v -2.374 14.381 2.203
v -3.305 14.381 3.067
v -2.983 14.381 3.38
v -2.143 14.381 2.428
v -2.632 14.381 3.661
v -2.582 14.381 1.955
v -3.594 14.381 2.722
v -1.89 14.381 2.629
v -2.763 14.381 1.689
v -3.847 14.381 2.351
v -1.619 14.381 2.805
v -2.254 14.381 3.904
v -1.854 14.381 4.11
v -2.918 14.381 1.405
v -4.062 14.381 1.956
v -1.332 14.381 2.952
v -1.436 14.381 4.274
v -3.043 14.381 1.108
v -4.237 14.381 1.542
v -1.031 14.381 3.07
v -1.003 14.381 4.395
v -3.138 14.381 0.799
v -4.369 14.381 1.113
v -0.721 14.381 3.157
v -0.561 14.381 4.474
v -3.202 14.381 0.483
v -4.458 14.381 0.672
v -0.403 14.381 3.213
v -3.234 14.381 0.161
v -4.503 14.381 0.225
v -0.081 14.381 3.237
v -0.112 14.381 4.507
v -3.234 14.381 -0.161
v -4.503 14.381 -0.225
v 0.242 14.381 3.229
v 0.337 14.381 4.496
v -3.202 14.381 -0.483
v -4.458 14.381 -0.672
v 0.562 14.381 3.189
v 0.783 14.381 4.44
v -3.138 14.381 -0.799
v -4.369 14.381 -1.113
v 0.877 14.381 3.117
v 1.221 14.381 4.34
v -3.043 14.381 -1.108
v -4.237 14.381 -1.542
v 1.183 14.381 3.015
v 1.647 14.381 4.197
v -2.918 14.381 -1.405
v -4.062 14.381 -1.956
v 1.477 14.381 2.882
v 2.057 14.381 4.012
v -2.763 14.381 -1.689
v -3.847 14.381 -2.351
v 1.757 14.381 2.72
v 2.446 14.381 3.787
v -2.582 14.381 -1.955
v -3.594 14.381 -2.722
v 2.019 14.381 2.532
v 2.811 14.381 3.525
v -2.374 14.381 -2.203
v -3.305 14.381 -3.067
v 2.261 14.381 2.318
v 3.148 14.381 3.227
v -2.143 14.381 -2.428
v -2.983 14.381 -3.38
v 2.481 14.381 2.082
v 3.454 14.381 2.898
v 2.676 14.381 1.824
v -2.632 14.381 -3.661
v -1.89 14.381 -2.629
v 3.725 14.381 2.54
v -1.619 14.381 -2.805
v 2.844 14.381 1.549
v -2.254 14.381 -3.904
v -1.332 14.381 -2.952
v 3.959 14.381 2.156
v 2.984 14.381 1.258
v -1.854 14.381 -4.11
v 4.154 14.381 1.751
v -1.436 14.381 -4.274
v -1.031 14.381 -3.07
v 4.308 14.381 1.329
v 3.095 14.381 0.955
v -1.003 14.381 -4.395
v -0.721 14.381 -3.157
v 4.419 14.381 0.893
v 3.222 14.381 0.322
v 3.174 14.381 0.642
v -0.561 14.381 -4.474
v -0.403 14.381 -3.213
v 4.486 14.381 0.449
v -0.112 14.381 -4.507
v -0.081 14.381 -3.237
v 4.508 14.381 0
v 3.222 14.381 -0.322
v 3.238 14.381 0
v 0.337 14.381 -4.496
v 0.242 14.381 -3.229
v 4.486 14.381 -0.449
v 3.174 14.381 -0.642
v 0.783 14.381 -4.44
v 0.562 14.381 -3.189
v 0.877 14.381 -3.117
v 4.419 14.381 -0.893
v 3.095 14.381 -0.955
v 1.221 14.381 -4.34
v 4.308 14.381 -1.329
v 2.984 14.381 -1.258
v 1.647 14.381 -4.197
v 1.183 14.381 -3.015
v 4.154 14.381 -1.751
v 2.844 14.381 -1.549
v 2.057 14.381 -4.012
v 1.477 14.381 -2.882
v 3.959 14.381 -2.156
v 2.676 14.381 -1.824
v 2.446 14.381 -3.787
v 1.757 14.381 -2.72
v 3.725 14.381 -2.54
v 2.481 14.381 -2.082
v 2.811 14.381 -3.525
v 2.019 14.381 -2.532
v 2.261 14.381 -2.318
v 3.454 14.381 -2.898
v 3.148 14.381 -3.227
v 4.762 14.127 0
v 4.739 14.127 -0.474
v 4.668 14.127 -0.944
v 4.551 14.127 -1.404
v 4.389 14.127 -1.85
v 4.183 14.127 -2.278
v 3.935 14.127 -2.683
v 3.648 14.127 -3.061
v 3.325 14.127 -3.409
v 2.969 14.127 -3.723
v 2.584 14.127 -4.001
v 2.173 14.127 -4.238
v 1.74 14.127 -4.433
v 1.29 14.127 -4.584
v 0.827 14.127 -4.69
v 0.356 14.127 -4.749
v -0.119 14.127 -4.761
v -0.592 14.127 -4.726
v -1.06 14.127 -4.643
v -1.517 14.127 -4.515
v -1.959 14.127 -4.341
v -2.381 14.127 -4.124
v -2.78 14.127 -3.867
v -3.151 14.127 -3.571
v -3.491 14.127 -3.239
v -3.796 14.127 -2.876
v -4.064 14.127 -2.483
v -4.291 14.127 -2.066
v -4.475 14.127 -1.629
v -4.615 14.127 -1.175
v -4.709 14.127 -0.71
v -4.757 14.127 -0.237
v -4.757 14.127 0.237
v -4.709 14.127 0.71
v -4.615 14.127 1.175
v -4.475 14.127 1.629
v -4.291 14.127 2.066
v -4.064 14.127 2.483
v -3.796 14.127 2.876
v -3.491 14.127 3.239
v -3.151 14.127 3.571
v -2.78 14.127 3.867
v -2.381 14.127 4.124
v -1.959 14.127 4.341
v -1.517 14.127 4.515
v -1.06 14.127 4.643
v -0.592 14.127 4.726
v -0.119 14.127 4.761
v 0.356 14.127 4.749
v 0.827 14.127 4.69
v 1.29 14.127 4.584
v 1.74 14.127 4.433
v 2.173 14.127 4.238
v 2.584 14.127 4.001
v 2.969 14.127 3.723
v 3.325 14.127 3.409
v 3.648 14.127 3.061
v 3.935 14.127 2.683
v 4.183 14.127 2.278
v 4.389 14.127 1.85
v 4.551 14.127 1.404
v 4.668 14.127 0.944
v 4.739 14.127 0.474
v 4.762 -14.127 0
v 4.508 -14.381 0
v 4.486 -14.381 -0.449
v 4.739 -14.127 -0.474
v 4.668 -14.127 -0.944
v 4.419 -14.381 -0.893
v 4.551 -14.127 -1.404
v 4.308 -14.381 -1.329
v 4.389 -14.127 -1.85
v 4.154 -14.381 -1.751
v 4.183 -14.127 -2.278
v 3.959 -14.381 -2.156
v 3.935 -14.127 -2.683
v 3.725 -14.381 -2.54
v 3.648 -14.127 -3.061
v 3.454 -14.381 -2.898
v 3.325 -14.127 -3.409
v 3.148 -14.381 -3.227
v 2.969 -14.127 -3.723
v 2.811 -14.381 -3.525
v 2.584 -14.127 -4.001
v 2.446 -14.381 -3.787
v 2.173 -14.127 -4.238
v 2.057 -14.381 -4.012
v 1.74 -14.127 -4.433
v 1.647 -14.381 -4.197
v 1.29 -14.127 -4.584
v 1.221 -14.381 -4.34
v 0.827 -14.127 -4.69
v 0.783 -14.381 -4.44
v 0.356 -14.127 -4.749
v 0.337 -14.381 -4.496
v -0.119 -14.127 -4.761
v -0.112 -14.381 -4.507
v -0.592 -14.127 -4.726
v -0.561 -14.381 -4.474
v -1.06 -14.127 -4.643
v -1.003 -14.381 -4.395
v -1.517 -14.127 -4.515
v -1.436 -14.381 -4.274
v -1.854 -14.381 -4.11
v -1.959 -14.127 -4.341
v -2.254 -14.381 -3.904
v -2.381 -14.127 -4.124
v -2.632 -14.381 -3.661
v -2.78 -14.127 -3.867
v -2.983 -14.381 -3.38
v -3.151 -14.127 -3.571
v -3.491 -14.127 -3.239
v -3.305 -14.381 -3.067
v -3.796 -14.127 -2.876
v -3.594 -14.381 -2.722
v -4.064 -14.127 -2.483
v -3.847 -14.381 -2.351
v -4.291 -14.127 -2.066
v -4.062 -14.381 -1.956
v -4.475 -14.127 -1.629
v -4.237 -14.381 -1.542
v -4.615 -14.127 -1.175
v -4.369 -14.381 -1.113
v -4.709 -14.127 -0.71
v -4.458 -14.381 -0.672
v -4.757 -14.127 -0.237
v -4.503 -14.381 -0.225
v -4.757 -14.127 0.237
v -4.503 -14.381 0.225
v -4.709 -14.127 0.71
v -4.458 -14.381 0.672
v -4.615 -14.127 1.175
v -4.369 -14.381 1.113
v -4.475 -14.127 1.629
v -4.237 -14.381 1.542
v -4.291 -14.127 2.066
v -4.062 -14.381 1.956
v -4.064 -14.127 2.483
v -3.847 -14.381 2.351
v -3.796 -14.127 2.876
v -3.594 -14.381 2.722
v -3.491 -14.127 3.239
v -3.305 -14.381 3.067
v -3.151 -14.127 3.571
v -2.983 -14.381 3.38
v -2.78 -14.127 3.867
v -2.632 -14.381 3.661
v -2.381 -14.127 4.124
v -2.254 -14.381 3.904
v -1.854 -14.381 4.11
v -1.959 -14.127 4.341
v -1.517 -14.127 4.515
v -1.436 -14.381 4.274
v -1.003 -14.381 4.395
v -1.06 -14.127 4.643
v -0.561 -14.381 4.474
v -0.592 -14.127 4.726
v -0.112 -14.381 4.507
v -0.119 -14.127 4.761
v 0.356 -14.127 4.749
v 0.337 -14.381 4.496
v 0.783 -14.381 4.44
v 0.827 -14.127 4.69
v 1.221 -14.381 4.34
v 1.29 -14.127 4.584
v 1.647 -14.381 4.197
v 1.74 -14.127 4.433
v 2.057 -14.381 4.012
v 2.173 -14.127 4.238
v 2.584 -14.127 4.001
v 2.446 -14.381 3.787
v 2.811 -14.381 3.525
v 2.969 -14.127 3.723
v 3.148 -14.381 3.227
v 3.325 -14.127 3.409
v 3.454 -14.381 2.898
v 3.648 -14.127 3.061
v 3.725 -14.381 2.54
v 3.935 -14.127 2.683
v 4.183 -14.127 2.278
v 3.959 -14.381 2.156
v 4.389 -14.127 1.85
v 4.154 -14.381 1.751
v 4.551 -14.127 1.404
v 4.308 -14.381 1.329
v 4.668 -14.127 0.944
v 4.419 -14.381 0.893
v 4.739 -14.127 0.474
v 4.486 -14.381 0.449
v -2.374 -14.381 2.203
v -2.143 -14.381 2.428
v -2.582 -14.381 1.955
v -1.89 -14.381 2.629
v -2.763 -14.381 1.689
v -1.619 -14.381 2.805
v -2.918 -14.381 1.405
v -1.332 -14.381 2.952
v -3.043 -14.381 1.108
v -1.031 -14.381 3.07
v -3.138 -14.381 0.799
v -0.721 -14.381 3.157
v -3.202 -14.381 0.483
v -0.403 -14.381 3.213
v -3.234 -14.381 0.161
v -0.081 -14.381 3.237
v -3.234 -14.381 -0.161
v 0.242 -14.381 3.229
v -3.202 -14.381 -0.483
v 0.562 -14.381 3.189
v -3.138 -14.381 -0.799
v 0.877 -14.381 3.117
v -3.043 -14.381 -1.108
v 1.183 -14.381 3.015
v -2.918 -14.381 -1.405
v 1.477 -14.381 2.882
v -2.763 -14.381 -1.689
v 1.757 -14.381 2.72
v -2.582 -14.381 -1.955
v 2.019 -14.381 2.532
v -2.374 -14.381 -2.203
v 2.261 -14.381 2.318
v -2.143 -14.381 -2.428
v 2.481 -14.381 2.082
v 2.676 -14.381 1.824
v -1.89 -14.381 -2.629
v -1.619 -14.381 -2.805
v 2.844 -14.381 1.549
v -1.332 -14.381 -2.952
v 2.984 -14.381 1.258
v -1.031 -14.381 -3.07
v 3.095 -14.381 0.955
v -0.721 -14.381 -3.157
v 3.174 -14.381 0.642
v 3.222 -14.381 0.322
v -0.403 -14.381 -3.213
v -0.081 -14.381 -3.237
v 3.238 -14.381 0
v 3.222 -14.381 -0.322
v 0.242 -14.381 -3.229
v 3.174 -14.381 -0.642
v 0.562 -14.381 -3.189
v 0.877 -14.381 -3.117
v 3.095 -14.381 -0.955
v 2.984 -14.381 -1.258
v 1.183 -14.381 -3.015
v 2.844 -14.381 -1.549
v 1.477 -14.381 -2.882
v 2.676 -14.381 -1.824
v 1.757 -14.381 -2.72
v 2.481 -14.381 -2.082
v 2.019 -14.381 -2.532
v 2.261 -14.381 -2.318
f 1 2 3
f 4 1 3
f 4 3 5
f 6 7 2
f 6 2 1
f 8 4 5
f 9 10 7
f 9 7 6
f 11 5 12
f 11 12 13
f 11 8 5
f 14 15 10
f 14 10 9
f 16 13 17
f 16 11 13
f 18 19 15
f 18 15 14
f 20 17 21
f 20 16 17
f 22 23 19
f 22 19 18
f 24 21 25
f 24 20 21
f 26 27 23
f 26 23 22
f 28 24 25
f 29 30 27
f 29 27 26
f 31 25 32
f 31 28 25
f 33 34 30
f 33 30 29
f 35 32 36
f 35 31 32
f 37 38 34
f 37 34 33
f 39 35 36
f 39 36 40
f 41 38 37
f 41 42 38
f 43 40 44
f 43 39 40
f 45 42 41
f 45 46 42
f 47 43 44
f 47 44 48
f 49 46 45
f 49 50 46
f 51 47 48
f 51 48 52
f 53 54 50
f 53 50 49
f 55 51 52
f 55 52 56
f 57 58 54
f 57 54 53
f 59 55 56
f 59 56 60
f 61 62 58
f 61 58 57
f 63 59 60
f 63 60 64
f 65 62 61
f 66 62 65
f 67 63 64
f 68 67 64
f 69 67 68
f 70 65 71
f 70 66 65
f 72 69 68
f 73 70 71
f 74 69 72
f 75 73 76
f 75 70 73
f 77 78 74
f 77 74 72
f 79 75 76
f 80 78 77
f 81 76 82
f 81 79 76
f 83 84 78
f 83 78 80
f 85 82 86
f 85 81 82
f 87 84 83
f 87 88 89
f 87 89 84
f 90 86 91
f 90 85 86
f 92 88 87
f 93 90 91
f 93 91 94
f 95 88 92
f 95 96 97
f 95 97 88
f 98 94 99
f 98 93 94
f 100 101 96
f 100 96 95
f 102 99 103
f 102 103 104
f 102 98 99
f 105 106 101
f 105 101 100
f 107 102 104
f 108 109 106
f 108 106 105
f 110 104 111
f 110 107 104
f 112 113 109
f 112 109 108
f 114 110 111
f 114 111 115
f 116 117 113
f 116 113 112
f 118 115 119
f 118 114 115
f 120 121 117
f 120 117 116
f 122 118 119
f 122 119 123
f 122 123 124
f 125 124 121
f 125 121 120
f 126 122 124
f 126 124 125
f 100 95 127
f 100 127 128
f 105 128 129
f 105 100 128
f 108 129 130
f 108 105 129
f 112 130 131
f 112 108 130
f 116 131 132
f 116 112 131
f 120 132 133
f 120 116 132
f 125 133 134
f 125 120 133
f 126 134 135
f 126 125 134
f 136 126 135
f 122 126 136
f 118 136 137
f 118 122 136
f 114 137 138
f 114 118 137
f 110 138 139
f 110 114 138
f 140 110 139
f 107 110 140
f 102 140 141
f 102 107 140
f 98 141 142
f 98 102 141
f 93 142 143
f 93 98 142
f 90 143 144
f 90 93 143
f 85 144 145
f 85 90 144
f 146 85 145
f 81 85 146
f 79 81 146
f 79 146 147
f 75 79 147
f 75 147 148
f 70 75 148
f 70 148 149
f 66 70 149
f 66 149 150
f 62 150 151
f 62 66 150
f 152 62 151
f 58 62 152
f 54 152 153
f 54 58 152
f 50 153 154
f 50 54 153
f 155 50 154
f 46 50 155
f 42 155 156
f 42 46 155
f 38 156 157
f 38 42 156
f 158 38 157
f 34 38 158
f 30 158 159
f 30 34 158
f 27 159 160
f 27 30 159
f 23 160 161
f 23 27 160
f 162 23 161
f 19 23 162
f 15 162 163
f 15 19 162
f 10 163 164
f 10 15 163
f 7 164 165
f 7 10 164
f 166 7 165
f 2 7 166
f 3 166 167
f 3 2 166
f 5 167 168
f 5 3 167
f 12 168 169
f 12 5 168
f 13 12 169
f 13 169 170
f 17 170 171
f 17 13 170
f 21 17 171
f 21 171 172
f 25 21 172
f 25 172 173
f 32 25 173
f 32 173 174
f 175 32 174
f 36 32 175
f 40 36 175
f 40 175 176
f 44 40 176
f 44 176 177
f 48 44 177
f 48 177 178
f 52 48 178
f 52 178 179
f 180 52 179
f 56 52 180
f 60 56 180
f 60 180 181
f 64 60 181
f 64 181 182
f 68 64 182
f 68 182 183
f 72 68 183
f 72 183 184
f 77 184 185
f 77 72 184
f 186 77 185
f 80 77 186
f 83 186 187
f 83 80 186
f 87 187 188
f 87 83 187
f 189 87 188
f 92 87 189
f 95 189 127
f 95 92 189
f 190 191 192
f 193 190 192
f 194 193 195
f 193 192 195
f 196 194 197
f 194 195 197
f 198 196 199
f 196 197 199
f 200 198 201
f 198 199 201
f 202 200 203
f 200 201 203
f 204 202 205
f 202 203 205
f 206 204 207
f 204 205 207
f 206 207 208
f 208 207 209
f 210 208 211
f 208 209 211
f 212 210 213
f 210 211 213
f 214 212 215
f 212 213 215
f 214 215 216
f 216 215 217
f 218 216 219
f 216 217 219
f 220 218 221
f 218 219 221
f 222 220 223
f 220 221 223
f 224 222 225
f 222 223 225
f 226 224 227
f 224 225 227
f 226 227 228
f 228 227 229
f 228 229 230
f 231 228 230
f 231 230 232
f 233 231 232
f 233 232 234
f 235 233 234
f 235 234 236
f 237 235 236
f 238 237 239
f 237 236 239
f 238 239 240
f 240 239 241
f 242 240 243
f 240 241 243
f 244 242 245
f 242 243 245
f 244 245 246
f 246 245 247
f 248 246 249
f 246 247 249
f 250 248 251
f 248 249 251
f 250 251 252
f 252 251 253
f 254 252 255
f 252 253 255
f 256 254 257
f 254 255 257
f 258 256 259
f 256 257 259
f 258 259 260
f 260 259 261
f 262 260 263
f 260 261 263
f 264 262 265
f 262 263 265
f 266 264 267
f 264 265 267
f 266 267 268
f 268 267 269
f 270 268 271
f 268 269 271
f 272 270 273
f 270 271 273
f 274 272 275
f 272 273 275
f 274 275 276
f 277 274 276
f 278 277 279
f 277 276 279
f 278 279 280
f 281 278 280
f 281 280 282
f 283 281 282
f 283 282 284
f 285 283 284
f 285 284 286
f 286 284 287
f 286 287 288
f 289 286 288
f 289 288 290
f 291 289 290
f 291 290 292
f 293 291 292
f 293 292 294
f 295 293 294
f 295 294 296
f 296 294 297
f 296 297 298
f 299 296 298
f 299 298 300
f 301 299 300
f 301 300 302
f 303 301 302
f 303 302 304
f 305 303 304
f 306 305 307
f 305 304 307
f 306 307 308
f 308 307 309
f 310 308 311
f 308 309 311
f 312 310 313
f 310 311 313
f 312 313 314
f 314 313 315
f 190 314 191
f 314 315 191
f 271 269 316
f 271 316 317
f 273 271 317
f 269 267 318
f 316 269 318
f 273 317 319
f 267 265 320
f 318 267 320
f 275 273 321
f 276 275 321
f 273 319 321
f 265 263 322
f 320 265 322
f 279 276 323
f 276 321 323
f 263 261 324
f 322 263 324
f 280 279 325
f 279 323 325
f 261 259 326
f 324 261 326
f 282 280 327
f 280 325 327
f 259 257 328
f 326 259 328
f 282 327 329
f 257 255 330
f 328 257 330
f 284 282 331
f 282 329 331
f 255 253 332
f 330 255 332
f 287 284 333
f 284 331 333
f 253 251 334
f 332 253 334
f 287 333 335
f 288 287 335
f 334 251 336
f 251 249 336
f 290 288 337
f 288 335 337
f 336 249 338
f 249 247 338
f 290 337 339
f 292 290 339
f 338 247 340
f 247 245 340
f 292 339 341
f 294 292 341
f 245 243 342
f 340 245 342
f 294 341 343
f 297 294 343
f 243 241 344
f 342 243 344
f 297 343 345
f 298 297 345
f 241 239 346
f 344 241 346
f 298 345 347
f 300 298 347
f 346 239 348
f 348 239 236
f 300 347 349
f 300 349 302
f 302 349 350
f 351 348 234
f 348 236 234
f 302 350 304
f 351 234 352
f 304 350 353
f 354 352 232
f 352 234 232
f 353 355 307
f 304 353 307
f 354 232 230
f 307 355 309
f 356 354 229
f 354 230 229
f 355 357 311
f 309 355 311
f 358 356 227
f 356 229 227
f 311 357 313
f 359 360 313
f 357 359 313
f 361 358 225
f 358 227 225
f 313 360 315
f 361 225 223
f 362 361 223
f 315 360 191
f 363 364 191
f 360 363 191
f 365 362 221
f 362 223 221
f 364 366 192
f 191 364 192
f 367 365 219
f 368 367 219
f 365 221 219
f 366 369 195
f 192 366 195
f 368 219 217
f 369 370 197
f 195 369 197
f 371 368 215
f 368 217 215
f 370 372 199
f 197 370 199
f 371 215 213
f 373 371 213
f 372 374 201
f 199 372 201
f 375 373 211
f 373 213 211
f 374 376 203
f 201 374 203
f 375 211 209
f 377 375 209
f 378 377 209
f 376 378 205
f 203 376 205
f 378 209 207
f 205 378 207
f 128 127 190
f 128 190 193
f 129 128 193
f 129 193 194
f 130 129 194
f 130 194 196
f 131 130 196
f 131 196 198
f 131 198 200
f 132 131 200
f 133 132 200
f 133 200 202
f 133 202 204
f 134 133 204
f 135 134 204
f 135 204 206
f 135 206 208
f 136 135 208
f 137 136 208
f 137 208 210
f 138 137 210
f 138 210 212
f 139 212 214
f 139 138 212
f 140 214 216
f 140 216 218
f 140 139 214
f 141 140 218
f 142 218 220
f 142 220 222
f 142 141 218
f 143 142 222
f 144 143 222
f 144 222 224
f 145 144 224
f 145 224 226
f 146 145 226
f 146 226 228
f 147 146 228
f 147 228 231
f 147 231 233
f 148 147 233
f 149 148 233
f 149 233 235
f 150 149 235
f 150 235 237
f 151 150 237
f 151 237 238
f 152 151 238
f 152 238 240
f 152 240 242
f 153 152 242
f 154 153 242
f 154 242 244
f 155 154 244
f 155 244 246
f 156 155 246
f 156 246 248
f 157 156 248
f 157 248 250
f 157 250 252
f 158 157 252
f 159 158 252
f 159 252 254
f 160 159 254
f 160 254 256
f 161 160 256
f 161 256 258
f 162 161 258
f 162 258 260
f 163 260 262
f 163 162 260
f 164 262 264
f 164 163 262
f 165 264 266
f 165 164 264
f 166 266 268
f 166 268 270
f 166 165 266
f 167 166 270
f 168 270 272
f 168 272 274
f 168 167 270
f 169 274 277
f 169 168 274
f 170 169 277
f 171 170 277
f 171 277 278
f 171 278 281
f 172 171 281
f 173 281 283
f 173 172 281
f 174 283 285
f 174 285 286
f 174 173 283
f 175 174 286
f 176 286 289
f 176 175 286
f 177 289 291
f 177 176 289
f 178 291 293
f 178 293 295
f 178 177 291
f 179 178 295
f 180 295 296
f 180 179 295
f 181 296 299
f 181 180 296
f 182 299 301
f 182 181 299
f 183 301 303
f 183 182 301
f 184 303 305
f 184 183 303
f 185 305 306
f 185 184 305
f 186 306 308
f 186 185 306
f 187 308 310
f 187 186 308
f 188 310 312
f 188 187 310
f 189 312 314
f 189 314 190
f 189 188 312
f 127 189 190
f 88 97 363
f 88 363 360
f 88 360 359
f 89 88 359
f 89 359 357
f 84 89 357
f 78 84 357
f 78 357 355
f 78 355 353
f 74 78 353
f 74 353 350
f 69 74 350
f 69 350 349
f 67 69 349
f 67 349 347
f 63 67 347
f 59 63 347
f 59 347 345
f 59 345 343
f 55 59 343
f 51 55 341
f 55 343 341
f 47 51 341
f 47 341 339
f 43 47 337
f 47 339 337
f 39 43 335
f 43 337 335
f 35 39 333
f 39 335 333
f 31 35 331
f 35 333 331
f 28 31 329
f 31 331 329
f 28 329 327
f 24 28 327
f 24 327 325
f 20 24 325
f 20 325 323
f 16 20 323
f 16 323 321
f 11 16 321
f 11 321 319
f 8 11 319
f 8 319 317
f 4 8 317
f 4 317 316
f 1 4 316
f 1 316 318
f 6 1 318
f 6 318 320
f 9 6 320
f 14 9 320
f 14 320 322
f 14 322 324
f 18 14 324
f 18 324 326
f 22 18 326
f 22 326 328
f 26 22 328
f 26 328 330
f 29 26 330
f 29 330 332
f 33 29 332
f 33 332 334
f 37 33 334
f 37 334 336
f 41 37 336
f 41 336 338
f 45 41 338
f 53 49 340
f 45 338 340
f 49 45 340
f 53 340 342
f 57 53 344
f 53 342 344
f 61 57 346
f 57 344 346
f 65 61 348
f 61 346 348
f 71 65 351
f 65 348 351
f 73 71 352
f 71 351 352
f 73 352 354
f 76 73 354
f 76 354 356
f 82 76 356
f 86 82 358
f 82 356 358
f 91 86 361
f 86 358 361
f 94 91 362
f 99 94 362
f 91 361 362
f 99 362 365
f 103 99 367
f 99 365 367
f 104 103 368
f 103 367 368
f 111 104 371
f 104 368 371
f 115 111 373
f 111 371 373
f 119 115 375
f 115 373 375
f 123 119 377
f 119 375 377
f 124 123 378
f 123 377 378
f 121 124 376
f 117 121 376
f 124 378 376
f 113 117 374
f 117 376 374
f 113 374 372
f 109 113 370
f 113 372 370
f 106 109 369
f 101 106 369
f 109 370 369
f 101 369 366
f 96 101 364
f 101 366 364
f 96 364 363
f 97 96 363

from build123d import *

# Parameters (mm, degrees)
SKETCH1_R           = 4.7625
BOSS_EXTRUDE1_DEPTH = 14.381250003
CHAMFER1_SIZE       = 0.254
SKETCH2_R           = 3.2385
CUT_EXTRUDE1_DEPTH  = 29.762500006


with BuildPart() as part:
    # Sketch1 → Boss-Extrude1 (new body, symmetric)
    with BuildSketch(Plane(origin=(0, 0, 0), x_dir=(1, 0, 0), z_dir=(0, 1, 0))):
        Circle(SKETCH1_R)
    extrude(amount=BOSS_EXTRUDE1_DEPTH, both=True)

    # Chamfer1
    chamfer1_edges = [part.edges().sort_by_distance(p)[0] for p in [
        (-4.7625, -14.381250003, 0),
        (-4.7625, 14.381250003, 0),
    ]]
    chamfer(chamfer1_edges, length=CHAMFER1_SIZE)

    # Sketch2 → Cut-Extrude1 (cut, through all)
    with BuildSketch(Plane.XZ.offset(14.381250003)):
        Circle(SKETCH2_R)
    extrude(amount=-CUT_EXTRUDE1_DEPTH, mode=Mode.SUBTRACT)


solid = part.part
